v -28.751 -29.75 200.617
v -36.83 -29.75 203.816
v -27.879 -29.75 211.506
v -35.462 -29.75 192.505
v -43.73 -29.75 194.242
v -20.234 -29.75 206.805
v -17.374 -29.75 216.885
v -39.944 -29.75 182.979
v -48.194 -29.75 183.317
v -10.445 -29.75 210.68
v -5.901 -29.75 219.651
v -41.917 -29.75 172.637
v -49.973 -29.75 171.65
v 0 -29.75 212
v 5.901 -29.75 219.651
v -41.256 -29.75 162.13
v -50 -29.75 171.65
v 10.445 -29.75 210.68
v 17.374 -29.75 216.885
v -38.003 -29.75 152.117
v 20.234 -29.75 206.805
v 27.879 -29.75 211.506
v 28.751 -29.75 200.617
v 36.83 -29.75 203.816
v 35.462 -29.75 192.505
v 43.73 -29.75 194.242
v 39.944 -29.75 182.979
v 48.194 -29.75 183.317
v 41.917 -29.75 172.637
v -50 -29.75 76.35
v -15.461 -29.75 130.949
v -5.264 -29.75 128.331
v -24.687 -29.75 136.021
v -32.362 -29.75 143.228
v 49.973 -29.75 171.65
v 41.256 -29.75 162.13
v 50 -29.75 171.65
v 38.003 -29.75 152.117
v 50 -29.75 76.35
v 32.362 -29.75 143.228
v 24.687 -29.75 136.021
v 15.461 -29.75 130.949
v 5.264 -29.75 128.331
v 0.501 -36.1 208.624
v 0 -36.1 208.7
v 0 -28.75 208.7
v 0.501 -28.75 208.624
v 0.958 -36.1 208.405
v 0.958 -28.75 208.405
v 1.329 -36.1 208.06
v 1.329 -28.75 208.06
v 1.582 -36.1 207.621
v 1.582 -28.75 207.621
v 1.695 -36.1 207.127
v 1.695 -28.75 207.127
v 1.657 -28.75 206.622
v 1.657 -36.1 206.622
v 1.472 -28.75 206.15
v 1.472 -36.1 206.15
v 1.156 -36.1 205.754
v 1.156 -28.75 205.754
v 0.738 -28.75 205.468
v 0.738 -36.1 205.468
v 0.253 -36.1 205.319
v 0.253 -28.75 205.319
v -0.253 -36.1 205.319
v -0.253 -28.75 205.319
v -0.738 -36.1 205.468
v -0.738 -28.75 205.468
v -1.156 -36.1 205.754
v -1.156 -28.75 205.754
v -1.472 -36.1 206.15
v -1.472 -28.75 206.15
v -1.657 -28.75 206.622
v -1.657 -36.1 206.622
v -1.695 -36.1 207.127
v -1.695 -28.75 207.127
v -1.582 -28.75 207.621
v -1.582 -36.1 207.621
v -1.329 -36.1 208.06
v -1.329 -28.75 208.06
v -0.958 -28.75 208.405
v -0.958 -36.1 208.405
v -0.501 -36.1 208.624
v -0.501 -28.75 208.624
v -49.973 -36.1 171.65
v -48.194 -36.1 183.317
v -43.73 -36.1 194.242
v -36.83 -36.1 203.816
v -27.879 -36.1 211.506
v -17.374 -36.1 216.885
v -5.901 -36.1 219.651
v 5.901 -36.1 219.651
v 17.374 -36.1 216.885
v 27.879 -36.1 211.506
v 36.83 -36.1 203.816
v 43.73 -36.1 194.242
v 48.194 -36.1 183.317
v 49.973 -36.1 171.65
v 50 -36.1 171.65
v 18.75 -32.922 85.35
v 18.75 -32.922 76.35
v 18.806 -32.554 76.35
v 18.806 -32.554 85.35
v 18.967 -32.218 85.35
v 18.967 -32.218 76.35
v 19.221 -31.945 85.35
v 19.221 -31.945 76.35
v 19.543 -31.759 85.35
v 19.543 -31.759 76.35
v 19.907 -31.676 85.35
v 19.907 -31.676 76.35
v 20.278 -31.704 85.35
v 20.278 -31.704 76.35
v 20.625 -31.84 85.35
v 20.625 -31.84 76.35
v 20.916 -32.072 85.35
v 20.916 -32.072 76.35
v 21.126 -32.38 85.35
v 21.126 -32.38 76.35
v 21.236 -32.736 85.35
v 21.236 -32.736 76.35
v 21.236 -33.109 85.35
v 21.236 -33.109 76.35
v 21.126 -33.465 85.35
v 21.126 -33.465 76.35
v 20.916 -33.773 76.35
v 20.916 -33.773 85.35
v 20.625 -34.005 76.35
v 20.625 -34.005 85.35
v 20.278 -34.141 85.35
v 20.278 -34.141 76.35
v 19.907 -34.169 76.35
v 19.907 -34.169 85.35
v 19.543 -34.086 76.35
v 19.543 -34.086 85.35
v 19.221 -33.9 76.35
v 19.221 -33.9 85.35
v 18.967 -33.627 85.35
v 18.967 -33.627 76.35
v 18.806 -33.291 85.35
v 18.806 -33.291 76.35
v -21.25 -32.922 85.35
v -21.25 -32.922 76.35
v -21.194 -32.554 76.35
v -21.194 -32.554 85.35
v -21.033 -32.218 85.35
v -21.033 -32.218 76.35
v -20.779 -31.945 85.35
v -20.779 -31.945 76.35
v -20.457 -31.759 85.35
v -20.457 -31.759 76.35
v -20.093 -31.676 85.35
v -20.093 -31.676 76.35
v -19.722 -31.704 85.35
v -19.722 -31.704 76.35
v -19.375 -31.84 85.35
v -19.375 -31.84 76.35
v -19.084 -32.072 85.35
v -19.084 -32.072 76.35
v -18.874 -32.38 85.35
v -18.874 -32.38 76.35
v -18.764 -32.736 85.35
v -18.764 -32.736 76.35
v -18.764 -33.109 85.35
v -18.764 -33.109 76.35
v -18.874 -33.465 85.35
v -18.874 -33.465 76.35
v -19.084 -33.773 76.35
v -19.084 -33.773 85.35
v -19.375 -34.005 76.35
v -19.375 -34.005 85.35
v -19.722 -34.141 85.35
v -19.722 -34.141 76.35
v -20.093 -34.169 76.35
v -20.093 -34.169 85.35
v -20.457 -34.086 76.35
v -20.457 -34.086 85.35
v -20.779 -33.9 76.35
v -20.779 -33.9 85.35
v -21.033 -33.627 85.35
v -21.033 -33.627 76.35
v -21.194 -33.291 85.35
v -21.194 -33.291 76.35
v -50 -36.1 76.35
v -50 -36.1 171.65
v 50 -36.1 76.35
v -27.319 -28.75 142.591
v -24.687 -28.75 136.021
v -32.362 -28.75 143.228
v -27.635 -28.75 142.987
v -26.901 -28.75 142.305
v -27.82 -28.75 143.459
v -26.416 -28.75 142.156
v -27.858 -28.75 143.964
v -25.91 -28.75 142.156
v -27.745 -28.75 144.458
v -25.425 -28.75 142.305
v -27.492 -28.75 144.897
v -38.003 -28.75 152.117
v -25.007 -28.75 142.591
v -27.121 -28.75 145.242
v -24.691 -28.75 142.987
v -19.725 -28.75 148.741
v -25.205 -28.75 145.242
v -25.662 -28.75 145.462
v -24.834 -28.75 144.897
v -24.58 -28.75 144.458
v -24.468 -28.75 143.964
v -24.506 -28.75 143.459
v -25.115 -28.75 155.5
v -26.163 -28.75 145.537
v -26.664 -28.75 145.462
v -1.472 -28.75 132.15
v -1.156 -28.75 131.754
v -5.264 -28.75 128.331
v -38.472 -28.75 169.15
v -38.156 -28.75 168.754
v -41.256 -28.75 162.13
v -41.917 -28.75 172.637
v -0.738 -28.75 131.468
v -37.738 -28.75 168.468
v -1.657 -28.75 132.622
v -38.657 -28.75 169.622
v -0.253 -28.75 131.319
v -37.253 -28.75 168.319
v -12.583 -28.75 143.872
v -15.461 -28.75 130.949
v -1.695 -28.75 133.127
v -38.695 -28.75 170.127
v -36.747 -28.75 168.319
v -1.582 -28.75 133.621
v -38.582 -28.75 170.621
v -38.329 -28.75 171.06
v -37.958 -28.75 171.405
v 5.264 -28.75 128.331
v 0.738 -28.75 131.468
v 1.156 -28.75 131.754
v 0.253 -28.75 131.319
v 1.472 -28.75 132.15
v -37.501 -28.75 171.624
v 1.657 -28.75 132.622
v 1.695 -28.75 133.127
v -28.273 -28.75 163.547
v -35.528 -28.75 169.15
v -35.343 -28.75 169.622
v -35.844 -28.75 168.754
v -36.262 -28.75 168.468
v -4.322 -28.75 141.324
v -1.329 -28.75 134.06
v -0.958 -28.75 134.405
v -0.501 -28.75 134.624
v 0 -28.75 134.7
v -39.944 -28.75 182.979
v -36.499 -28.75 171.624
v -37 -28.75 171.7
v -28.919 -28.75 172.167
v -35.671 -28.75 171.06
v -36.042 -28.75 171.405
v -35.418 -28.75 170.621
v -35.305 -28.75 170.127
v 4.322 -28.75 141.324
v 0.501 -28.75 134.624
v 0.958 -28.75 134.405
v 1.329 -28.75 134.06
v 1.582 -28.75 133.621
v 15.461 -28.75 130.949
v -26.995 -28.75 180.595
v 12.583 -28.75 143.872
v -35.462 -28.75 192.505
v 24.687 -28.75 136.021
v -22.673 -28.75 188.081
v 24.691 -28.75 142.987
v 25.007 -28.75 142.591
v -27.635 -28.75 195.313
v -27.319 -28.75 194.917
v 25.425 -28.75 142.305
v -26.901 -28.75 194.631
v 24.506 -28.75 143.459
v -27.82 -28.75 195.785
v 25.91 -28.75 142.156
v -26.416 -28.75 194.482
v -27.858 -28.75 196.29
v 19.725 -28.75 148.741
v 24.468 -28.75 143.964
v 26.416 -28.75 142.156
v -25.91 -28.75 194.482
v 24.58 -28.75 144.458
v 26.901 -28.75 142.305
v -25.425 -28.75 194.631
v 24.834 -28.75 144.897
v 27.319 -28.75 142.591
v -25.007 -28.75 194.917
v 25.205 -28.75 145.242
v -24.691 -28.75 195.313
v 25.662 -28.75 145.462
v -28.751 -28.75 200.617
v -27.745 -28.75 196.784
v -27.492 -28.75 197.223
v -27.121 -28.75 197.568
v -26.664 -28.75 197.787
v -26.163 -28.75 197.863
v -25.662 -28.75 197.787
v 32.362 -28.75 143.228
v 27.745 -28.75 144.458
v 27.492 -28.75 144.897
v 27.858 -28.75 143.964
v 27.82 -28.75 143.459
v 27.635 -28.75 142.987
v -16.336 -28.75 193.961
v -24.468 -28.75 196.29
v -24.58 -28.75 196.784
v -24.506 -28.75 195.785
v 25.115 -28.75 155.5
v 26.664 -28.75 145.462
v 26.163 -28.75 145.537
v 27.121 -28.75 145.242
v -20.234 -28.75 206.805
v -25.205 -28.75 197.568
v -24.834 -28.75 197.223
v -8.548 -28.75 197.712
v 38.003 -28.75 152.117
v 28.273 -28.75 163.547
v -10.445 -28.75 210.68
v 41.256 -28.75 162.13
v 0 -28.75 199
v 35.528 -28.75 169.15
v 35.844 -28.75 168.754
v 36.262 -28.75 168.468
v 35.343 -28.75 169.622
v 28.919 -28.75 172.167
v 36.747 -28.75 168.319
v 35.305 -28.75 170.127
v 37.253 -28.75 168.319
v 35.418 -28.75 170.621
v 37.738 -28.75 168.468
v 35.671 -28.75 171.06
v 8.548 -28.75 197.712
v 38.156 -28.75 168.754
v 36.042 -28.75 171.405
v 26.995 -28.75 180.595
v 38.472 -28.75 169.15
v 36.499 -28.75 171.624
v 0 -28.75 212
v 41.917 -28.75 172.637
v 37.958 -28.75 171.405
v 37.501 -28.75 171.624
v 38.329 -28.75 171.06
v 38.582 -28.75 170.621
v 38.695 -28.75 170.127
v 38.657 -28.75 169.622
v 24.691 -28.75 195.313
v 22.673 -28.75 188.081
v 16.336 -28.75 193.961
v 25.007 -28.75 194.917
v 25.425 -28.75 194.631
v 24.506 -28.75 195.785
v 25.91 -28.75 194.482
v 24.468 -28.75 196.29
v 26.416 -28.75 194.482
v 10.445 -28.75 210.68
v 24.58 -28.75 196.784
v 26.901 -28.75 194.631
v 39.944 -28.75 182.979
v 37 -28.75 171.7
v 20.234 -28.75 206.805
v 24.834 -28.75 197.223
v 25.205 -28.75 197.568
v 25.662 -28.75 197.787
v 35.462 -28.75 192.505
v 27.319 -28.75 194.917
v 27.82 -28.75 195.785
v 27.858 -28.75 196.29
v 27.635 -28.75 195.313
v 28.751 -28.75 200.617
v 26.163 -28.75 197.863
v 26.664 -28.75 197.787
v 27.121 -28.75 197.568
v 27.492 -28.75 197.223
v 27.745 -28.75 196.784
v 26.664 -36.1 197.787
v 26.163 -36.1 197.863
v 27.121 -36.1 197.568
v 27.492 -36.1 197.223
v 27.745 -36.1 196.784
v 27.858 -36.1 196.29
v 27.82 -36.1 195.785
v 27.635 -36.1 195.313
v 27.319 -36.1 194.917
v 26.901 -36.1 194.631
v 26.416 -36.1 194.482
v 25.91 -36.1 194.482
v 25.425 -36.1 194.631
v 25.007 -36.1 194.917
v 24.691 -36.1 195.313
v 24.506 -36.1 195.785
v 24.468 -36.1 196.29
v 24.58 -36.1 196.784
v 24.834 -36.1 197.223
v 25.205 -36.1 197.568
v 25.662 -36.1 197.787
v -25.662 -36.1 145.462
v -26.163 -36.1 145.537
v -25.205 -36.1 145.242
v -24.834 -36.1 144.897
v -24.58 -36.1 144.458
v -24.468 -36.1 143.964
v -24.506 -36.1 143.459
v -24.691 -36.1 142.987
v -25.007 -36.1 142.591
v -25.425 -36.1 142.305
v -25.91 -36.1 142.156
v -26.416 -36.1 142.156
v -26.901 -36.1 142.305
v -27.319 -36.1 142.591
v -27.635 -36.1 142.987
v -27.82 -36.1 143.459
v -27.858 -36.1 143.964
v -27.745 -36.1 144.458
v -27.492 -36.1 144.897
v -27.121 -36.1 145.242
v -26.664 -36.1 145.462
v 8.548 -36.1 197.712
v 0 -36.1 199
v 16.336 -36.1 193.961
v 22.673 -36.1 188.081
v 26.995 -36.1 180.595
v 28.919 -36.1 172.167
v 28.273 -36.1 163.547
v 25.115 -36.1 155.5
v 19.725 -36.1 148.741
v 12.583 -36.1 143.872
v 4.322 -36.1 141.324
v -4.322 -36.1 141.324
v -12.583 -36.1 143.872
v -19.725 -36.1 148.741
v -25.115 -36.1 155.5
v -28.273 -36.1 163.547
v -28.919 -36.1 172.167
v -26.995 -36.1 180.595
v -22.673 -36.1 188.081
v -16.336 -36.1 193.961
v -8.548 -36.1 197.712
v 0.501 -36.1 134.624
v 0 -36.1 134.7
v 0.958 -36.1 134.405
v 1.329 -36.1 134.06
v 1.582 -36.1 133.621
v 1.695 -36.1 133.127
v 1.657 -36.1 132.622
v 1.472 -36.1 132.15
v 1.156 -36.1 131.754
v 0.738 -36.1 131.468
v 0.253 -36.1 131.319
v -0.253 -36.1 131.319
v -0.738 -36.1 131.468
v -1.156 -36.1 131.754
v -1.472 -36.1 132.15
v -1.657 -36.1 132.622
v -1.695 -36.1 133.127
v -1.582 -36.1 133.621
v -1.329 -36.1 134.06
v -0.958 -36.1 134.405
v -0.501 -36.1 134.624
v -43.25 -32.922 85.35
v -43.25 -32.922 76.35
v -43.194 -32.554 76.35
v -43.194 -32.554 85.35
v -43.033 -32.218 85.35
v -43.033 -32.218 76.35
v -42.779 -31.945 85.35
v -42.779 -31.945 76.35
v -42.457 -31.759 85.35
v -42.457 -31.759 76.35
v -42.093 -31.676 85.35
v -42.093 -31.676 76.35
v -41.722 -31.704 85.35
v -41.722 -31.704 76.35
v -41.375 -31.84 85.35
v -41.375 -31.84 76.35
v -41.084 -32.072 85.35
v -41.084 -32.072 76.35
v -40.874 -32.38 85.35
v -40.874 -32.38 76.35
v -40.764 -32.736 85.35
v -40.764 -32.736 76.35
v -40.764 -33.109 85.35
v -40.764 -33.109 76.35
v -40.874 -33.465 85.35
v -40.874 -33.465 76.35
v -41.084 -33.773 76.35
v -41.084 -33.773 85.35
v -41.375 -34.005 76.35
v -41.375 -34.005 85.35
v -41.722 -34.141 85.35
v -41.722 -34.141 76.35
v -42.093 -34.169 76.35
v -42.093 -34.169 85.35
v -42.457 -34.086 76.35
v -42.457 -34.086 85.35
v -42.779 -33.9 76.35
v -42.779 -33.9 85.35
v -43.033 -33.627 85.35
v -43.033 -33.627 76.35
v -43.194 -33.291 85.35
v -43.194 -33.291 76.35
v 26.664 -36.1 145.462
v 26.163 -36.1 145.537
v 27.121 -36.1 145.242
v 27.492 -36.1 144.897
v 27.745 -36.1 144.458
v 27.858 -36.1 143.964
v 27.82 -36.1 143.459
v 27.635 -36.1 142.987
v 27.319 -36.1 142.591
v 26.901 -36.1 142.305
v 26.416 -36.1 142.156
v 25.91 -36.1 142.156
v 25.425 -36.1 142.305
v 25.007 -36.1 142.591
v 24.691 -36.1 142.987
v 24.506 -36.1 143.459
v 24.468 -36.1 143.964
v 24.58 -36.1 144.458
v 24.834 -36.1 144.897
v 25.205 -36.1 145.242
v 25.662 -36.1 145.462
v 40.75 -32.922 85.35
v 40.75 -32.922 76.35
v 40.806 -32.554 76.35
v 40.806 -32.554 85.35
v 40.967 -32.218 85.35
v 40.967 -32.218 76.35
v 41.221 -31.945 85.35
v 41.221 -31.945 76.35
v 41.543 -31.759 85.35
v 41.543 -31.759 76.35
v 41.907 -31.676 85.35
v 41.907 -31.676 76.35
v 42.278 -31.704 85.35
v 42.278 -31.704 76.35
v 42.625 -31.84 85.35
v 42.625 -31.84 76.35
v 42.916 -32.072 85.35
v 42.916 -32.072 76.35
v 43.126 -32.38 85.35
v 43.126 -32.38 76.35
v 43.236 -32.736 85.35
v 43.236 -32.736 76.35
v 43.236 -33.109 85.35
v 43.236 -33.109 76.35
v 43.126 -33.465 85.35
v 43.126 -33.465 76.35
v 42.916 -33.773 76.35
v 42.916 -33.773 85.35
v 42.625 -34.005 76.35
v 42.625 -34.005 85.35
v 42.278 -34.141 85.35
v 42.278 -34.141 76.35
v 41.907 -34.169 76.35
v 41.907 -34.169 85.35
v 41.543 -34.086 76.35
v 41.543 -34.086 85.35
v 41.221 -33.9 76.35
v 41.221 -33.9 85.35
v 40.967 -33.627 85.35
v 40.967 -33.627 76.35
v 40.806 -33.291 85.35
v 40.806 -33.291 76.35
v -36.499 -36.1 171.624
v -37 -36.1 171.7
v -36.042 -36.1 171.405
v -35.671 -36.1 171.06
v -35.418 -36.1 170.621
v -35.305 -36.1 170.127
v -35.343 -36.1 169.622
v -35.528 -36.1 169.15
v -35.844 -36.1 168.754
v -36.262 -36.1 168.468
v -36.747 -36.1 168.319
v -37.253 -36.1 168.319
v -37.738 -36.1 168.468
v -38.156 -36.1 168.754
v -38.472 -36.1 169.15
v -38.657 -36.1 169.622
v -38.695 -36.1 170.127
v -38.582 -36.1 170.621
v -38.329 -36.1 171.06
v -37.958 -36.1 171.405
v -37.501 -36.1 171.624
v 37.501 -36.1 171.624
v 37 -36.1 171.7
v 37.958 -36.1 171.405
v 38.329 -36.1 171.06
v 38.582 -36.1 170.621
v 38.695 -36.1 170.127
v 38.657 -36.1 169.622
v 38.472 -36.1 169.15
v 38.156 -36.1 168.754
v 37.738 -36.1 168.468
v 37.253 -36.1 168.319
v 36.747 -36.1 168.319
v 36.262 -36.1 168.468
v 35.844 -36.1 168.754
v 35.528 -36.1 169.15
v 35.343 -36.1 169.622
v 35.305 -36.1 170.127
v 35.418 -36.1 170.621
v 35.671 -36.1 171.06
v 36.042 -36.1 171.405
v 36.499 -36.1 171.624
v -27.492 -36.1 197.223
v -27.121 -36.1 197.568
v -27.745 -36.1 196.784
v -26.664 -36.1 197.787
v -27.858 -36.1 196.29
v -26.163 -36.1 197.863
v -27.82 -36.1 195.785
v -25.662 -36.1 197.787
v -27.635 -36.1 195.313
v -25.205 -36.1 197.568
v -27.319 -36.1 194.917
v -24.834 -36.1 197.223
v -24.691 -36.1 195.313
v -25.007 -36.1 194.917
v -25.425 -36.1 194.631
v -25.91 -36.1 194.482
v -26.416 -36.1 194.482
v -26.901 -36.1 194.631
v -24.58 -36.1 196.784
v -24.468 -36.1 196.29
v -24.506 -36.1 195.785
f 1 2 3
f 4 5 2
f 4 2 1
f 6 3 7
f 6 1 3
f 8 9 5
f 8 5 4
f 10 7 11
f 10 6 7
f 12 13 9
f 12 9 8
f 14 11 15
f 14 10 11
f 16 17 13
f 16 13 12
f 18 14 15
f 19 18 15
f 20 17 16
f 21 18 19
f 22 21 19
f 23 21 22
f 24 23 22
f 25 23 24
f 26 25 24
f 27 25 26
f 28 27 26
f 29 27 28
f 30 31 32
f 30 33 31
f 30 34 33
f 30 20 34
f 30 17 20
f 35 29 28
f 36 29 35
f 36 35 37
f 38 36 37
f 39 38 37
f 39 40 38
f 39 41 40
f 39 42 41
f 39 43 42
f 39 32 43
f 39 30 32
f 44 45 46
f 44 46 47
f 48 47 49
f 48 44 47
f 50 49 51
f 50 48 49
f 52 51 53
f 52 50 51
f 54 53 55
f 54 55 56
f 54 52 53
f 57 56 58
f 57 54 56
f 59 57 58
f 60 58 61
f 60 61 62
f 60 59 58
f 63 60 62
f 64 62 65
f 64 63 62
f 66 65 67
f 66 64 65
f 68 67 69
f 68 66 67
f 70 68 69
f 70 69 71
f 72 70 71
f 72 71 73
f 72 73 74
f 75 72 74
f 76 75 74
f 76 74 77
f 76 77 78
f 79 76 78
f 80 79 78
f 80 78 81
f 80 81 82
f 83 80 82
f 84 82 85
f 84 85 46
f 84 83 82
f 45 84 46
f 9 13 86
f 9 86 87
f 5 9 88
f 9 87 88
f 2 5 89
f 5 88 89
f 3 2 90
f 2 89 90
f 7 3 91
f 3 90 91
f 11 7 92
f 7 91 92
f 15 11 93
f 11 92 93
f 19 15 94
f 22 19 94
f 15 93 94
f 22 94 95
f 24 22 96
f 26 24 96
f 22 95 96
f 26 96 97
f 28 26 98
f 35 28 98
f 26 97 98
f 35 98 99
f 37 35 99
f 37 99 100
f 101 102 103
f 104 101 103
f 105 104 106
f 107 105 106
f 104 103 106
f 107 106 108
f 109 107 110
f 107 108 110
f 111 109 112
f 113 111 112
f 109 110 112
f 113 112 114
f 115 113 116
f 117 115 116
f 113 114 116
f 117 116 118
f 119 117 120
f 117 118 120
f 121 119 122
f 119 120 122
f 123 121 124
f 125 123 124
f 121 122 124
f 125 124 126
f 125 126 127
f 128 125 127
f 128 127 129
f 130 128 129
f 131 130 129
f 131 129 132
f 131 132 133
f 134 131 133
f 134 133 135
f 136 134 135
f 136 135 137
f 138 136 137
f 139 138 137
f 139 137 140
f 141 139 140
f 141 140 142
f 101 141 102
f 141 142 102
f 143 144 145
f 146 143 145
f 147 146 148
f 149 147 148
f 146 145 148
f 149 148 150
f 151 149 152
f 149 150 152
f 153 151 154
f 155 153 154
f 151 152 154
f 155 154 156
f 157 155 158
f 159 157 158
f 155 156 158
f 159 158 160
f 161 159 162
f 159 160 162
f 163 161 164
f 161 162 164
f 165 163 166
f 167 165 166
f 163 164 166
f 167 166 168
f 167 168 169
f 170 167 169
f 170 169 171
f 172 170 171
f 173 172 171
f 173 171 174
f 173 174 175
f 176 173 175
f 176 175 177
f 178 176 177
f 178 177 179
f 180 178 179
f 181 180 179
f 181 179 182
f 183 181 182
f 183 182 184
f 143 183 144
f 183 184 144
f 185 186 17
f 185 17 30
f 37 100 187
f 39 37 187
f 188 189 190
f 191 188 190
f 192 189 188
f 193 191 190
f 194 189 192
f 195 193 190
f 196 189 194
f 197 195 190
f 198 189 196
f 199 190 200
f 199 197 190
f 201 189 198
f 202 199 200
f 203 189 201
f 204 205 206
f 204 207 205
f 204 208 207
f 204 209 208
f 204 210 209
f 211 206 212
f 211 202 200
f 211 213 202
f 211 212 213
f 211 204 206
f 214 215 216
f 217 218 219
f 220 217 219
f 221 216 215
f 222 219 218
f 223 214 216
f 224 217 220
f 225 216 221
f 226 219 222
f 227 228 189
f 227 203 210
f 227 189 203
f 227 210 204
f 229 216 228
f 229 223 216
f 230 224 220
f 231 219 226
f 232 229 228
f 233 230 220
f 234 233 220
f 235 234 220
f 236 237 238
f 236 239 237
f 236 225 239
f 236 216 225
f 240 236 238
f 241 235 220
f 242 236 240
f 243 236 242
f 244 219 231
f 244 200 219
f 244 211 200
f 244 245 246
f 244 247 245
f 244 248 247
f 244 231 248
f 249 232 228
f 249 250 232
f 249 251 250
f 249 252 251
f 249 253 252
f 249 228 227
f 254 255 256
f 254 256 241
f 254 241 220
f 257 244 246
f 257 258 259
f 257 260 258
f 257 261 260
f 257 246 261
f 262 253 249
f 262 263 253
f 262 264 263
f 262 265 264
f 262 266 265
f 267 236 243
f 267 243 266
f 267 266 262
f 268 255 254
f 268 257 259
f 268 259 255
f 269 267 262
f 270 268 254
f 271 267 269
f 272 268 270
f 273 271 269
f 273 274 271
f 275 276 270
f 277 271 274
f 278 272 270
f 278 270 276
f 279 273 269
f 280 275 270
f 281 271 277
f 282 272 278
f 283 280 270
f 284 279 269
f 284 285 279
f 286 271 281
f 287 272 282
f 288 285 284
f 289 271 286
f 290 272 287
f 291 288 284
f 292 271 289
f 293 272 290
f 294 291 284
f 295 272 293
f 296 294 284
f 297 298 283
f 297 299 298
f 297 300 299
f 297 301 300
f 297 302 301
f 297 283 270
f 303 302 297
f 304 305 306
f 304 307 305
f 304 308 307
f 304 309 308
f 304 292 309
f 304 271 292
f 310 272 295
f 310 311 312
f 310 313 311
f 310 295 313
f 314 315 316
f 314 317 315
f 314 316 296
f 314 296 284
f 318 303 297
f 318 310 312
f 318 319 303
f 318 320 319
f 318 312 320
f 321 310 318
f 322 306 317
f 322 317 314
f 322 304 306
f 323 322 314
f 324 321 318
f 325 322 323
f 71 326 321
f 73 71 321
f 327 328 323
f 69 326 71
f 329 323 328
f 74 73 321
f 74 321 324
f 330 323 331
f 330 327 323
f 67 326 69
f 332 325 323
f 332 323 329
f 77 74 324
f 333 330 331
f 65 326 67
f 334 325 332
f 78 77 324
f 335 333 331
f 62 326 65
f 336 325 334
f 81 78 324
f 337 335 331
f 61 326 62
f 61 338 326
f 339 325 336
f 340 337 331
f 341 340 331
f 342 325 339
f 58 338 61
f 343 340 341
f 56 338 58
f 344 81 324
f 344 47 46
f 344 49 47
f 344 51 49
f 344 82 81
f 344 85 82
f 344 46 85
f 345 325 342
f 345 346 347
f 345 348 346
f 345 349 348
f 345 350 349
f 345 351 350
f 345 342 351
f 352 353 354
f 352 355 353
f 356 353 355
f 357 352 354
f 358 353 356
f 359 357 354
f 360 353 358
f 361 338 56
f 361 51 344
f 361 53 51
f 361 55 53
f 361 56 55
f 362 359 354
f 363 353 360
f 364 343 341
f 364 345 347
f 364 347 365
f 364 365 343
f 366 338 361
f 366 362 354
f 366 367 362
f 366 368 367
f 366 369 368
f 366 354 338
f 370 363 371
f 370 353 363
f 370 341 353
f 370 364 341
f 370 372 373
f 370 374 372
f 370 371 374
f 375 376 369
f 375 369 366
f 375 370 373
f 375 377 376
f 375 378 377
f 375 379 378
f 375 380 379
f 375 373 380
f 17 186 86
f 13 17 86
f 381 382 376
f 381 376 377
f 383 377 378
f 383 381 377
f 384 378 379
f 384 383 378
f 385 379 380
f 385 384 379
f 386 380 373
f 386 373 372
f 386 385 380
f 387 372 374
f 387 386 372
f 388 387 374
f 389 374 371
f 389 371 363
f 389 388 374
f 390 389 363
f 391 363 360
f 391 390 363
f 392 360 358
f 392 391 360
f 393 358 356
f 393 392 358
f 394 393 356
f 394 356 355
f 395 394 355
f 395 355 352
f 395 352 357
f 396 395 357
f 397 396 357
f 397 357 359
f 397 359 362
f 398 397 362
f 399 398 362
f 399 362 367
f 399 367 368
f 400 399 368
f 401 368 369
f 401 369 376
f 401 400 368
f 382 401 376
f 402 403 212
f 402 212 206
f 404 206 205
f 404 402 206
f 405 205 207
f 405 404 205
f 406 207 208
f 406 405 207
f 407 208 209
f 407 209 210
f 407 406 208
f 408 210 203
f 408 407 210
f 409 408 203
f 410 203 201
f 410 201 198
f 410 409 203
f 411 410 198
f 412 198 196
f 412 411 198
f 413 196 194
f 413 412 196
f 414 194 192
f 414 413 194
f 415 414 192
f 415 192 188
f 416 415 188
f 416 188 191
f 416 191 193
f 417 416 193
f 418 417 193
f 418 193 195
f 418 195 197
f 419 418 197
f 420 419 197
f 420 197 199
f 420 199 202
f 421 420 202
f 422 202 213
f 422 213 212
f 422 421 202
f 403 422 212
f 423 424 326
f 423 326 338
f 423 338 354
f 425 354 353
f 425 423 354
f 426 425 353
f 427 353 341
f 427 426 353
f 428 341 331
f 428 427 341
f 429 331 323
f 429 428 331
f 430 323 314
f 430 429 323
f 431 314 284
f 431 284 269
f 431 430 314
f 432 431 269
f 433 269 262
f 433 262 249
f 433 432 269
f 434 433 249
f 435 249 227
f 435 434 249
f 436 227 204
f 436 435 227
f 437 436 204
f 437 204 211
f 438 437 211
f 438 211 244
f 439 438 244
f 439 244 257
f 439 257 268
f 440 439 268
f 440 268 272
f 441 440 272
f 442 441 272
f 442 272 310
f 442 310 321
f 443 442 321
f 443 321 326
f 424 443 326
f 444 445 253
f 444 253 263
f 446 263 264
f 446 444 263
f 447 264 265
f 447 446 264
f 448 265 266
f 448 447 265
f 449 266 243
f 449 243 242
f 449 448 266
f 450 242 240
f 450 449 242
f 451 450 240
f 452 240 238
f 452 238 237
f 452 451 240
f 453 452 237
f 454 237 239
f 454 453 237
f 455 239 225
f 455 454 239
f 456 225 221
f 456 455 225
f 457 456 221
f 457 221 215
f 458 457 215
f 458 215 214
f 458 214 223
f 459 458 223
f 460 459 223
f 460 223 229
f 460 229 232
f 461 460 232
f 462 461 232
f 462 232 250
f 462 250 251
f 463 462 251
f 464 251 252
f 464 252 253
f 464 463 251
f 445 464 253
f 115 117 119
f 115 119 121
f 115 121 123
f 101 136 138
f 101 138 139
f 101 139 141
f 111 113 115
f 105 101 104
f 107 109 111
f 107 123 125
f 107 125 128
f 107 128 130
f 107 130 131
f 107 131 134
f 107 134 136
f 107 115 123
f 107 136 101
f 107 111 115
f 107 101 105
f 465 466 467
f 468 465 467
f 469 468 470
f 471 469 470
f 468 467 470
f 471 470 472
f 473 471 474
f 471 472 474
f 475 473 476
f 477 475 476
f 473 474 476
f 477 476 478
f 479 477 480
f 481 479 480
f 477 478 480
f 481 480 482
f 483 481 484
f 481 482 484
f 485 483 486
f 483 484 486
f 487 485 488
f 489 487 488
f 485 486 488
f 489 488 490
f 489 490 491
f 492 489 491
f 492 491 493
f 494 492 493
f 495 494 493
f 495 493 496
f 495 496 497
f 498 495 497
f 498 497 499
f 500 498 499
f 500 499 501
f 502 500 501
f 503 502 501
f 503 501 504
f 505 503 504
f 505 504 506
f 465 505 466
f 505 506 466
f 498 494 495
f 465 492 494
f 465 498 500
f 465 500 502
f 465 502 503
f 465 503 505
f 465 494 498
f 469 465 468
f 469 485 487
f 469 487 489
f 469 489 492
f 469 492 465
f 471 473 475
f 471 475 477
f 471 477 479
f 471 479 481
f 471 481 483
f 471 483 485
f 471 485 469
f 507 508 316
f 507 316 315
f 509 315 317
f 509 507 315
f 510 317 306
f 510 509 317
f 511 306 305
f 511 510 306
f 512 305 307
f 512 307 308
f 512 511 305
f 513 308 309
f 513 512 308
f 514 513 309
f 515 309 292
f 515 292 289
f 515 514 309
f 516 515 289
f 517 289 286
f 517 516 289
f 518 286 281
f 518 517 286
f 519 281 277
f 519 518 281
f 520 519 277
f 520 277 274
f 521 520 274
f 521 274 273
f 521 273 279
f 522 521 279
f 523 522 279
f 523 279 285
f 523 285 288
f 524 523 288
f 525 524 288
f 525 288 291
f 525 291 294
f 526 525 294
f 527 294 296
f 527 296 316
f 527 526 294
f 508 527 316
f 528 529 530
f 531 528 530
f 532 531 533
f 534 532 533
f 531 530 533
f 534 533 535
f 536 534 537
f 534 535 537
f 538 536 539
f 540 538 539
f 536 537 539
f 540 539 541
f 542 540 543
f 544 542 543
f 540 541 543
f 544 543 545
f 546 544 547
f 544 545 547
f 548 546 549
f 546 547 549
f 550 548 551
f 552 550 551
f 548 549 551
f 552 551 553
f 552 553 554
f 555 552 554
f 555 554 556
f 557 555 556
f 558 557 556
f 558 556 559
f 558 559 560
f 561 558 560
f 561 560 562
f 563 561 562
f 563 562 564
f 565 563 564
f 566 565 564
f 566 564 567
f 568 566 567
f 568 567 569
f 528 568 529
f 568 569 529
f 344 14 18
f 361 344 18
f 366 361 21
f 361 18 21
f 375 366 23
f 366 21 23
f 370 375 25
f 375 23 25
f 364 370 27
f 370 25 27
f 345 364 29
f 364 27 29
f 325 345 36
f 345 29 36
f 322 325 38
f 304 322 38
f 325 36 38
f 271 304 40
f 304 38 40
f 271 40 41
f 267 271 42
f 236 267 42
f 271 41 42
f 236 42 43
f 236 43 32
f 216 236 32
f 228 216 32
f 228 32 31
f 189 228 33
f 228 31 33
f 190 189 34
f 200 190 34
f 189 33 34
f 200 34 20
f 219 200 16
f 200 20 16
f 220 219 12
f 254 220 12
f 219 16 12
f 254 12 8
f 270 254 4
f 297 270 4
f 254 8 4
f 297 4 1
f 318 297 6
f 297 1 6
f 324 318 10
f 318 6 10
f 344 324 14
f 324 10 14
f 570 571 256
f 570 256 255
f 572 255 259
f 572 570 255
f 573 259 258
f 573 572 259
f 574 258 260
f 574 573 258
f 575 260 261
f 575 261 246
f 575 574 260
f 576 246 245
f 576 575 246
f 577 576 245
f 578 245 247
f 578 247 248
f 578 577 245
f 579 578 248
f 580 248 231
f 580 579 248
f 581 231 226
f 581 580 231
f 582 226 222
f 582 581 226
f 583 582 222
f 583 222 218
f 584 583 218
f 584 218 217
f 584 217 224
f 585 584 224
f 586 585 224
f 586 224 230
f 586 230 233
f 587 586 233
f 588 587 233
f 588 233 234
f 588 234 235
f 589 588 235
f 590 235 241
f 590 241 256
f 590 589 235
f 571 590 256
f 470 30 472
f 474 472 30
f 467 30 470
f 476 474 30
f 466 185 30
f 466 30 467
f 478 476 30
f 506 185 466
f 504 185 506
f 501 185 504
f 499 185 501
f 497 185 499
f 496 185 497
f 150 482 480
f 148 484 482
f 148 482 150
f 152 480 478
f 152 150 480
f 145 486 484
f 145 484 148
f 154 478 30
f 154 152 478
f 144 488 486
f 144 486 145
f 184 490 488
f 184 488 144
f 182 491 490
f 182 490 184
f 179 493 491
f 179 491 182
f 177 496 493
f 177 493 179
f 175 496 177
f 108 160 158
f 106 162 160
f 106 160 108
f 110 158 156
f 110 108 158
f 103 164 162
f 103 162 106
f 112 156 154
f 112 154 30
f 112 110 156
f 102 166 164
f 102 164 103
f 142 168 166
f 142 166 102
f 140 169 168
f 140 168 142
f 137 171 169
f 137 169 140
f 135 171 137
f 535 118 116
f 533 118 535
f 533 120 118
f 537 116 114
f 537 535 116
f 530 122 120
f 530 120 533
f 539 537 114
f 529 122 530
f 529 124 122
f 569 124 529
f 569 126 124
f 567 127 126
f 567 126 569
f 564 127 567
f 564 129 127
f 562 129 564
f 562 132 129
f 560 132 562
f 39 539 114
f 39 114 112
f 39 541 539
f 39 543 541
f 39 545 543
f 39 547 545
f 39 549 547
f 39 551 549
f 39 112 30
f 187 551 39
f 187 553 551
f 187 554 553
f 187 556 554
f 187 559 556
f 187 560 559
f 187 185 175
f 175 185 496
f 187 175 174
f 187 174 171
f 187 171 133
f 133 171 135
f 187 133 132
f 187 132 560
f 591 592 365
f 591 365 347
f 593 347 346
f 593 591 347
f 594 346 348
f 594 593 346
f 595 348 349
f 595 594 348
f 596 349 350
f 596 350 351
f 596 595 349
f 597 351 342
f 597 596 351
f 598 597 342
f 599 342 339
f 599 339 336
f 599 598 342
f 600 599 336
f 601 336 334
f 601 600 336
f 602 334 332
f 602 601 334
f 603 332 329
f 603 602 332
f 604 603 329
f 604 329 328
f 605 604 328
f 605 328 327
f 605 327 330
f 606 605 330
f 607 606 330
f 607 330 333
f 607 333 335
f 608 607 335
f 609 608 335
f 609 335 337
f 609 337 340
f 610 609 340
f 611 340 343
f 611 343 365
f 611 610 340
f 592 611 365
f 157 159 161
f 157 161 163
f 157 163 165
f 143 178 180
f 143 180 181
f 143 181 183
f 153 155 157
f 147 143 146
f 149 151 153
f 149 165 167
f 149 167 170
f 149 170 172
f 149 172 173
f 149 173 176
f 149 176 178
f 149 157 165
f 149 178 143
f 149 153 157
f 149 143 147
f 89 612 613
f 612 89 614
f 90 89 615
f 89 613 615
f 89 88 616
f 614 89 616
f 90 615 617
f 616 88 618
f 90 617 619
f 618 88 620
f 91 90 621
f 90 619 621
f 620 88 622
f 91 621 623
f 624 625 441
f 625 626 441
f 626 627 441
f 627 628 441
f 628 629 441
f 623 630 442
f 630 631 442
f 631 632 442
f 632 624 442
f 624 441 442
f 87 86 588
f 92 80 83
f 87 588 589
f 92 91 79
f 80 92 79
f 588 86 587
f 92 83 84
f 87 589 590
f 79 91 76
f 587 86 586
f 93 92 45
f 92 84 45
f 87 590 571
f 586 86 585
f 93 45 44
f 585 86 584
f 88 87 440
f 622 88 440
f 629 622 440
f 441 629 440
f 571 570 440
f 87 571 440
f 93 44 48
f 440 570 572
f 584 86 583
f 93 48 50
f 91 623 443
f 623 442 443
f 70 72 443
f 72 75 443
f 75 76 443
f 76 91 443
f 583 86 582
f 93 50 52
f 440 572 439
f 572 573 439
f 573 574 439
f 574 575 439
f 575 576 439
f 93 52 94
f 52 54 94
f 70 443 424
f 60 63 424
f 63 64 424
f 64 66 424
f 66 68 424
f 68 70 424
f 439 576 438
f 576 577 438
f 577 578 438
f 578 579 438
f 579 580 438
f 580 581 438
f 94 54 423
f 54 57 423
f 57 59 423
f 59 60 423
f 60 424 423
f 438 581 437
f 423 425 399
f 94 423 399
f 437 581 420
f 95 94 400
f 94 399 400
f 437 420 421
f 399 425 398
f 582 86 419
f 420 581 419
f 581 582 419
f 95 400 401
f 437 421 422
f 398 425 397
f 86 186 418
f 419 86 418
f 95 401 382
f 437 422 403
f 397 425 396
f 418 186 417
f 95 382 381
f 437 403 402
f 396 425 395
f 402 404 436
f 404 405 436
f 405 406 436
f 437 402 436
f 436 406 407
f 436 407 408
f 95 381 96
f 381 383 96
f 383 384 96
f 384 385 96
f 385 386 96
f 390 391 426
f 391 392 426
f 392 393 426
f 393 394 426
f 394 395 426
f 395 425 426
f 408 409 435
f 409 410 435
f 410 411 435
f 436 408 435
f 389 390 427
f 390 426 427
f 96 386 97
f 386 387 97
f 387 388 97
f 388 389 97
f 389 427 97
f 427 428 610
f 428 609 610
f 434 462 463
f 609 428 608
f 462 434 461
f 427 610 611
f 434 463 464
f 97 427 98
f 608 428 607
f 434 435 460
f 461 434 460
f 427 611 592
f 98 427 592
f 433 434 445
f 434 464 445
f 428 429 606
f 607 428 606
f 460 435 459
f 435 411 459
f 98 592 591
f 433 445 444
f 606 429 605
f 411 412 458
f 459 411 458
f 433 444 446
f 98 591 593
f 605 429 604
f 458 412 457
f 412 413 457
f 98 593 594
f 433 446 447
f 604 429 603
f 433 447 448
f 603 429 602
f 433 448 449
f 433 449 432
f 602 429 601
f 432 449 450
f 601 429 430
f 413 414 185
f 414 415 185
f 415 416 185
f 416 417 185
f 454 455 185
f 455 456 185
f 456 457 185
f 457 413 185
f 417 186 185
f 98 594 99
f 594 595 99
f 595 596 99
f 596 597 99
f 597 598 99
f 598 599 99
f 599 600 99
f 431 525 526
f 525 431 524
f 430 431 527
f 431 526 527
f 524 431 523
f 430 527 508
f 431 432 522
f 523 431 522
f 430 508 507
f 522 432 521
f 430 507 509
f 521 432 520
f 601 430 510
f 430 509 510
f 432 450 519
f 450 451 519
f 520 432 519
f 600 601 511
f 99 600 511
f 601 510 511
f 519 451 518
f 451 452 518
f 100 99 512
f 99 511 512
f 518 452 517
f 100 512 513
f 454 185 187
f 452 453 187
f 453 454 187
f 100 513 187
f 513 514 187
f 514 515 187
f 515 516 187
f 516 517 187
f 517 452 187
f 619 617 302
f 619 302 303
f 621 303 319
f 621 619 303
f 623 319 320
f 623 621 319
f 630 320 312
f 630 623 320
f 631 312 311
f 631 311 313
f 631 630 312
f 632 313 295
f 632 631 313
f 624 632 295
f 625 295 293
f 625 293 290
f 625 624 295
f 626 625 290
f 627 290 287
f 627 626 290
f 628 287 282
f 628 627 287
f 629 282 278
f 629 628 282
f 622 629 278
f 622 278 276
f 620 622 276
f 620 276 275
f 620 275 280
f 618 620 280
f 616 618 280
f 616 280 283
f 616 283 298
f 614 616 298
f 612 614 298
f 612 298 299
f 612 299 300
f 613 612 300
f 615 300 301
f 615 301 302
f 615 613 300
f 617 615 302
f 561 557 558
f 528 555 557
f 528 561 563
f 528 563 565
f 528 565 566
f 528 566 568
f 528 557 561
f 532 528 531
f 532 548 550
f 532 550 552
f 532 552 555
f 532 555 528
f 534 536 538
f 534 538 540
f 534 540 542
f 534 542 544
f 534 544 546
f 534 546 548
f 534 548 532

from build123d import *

# Parameters (mm, degrees)
PARED_START                  = -36.1
SK_PARED_W                   = 100
SK_PARED_H                   = 95.3
PARED_DEPTH                  = 6.35
CABEZA_START                 = -36.1
SK_CABEZA_R                  = 50
CABEZA_DEPTH                 = 6.35
ASIENTO_1MM_START            = -29.75
SK_ASIENTO_1MM_R             = 42
SK_ASIENTO_1MM_R_2           = 29
ASIENTO_1MM_DEPTH            = 1
PASO_BOSS_J2_START           = -36.1
SK_PASO_BOSS_J2_R            = 29
PASO_BOSS_J2_DEPTH           = 7.35
PASANTES_M3_ESTATOR_J2_START = -36.1
SK_PASANTES_M3_ESTATOR_J2_R  = 1.7
PASANTES_M3_ESTATOR_J2_DEPTH = 7.35
SK_ROSCA_M3_DESDE_ABAJO_R    = 1.25
ROSCA_M3_DESDE_ABAJO_DEPTH   = 9


with BuildPart() as part:
    # Sk_Pared → Pared (new body)
    with BuildSketch(Plane(origin=(0, 0, 0), x_dir=(1, 0, 0), z_dir=(0, 1, 0)).offset(PARED_START)):
        with Locations((0, -124)):
            Rectangle(SK_PARED_W, SK_PARED_H)
    extrude(amount=PARED_DEPTH)

    # Sk_Cabeza → Cabeza (add)
    with BuildSketch(Plane(origin=(0, 0, 0), x_dir=(1, 0, 0), z_dir=(0, 1, 0)).offset(CABEZA_START)):
        with Locations((0, -170)):
            Circle(SK_CABEZA_R)
    extrude(amount=CABEZA_DEPTH)

    # Sk_Asiento_1mm → Asiento_1mm (add)
    with BuildSketch(Plane(origin=(0, 0, 0), x_dir=(1, 0, 0), z_dir=(0, 1, 0)).offset(ASIENTO_1MM_START)):
        with Locations(Location((0, -170, 0), (0, 0, 270))):
            Circle(SK_ASIENTO_1MM_R)
        with Locations(Location((0, -170, 0), (0, 0, 270))):
            Circle(SK_ASIENTO_1MM_R_2, mode=Mode.SUBTRACT)
    extrude(amount=ASIENTO_1MM_DEPTH)

    # Sk_Paso_boss_J2 → Paso_boss_J2 (cut)
    with BuildSketch(Plane(origin=(0, 0, 0), x_dir=(1, 0, 0), z_dir=(0, 1, 0)).offset(PASO_BOSS_J2_START)):
        with Locations(Location((0, -170, 0), (0, 0, 270))):
            Circle(SK_PASO_BOSS_J2_R)
    extrude(amount=PASO_BOSS_J2_DEPTH, mode=Mode.SUBTRACT)

    # Sk_Pasantes_M3_estator_J2 → Pasantes_M3_estator_J2 (cut)
    with BuildSketch(Plane(origin=(0, 0, 0), x_dir=(1, 0, 0), z_dir=(0, 1, 0)).offset(PASANTES_M3_ESTATOR_J2_START)):
        with Locations(Location((37, -170, 0), (0, 0, 270))):
            Circle(SK_PASANTES_M3_ESTATOR_J2_R)
        with Locations(Location((26.162950904, -196.162950904, 0), (0, 0, 270))):
            Circle(SK_PASANTES_M3_ESTATOR_J2_R)
        with Locations(Location((0, -207, 0), (0, 0, 270))):
            Circle(SK_PASANTES_M3_ESTATOR_J2_R)
        with Locations(Location((-26.162950904, -196.162950904, 0), (0, 0, 270))):
            Circle(SK_PASANTES_M3_ESTATOR_J2_R)
        with Locations(Location((-37, -170, 0), (0, 0, 270))):
            Circle(SK_PASANTES_M3_ESTATOR_J2_R)
        with Locations(Location((-26.162950904, -143.837049096, 0), (0, 0, 270))):
            Circle(SK_PASANTES_M3_ESTATOR_J2_R)
        with Locations(Location((0, -133, 0), (0, 0, 270))):
            Circle(SK_PASANTES_M3_ESTATOR_J2_R)
        with Locations(Location((26.162950904, -143.837049096, 0), (0, 0, 270))):
            Circle(SK_PASANTES_M3_ESTATOR_J2_R)
    extrude(amount=PASANTES_M3_ESTATOR_J2_DEPTH, mode=Mode.SUBTRACT)

    # Sk_Rosca_M3_desde_abajo → Rosca_M3_desde_abajo (cut)
    with BuildSketch(Plane(origin=(0, 0, 76.35), x_dir=(-1, 0, 0), z_dir=(0, 0, -1))):
        with Locations((42, -32.9225)):
            Circle(SK_ROSCA_M3_DESDE_ABAJO_R)
        with Locations((20, -32.9225)):
            Circle(SK_ROSCA_M3_DESDE_ABAJO_R)
        with Locations((-20, -32.9225)):
            Circle(SK_ROSCA_M3_DESDE_ABAJO_R)
        with Locations((-42, -32.9225)):
            Circle(SK_ROSCA_M3_DESDE_ABAJO_R)
    extrude(amount=-ROSCA_M3_DESDE_ABAJO_DEPTH, mode=Mode.SUBTRACT)


solid = part.part
